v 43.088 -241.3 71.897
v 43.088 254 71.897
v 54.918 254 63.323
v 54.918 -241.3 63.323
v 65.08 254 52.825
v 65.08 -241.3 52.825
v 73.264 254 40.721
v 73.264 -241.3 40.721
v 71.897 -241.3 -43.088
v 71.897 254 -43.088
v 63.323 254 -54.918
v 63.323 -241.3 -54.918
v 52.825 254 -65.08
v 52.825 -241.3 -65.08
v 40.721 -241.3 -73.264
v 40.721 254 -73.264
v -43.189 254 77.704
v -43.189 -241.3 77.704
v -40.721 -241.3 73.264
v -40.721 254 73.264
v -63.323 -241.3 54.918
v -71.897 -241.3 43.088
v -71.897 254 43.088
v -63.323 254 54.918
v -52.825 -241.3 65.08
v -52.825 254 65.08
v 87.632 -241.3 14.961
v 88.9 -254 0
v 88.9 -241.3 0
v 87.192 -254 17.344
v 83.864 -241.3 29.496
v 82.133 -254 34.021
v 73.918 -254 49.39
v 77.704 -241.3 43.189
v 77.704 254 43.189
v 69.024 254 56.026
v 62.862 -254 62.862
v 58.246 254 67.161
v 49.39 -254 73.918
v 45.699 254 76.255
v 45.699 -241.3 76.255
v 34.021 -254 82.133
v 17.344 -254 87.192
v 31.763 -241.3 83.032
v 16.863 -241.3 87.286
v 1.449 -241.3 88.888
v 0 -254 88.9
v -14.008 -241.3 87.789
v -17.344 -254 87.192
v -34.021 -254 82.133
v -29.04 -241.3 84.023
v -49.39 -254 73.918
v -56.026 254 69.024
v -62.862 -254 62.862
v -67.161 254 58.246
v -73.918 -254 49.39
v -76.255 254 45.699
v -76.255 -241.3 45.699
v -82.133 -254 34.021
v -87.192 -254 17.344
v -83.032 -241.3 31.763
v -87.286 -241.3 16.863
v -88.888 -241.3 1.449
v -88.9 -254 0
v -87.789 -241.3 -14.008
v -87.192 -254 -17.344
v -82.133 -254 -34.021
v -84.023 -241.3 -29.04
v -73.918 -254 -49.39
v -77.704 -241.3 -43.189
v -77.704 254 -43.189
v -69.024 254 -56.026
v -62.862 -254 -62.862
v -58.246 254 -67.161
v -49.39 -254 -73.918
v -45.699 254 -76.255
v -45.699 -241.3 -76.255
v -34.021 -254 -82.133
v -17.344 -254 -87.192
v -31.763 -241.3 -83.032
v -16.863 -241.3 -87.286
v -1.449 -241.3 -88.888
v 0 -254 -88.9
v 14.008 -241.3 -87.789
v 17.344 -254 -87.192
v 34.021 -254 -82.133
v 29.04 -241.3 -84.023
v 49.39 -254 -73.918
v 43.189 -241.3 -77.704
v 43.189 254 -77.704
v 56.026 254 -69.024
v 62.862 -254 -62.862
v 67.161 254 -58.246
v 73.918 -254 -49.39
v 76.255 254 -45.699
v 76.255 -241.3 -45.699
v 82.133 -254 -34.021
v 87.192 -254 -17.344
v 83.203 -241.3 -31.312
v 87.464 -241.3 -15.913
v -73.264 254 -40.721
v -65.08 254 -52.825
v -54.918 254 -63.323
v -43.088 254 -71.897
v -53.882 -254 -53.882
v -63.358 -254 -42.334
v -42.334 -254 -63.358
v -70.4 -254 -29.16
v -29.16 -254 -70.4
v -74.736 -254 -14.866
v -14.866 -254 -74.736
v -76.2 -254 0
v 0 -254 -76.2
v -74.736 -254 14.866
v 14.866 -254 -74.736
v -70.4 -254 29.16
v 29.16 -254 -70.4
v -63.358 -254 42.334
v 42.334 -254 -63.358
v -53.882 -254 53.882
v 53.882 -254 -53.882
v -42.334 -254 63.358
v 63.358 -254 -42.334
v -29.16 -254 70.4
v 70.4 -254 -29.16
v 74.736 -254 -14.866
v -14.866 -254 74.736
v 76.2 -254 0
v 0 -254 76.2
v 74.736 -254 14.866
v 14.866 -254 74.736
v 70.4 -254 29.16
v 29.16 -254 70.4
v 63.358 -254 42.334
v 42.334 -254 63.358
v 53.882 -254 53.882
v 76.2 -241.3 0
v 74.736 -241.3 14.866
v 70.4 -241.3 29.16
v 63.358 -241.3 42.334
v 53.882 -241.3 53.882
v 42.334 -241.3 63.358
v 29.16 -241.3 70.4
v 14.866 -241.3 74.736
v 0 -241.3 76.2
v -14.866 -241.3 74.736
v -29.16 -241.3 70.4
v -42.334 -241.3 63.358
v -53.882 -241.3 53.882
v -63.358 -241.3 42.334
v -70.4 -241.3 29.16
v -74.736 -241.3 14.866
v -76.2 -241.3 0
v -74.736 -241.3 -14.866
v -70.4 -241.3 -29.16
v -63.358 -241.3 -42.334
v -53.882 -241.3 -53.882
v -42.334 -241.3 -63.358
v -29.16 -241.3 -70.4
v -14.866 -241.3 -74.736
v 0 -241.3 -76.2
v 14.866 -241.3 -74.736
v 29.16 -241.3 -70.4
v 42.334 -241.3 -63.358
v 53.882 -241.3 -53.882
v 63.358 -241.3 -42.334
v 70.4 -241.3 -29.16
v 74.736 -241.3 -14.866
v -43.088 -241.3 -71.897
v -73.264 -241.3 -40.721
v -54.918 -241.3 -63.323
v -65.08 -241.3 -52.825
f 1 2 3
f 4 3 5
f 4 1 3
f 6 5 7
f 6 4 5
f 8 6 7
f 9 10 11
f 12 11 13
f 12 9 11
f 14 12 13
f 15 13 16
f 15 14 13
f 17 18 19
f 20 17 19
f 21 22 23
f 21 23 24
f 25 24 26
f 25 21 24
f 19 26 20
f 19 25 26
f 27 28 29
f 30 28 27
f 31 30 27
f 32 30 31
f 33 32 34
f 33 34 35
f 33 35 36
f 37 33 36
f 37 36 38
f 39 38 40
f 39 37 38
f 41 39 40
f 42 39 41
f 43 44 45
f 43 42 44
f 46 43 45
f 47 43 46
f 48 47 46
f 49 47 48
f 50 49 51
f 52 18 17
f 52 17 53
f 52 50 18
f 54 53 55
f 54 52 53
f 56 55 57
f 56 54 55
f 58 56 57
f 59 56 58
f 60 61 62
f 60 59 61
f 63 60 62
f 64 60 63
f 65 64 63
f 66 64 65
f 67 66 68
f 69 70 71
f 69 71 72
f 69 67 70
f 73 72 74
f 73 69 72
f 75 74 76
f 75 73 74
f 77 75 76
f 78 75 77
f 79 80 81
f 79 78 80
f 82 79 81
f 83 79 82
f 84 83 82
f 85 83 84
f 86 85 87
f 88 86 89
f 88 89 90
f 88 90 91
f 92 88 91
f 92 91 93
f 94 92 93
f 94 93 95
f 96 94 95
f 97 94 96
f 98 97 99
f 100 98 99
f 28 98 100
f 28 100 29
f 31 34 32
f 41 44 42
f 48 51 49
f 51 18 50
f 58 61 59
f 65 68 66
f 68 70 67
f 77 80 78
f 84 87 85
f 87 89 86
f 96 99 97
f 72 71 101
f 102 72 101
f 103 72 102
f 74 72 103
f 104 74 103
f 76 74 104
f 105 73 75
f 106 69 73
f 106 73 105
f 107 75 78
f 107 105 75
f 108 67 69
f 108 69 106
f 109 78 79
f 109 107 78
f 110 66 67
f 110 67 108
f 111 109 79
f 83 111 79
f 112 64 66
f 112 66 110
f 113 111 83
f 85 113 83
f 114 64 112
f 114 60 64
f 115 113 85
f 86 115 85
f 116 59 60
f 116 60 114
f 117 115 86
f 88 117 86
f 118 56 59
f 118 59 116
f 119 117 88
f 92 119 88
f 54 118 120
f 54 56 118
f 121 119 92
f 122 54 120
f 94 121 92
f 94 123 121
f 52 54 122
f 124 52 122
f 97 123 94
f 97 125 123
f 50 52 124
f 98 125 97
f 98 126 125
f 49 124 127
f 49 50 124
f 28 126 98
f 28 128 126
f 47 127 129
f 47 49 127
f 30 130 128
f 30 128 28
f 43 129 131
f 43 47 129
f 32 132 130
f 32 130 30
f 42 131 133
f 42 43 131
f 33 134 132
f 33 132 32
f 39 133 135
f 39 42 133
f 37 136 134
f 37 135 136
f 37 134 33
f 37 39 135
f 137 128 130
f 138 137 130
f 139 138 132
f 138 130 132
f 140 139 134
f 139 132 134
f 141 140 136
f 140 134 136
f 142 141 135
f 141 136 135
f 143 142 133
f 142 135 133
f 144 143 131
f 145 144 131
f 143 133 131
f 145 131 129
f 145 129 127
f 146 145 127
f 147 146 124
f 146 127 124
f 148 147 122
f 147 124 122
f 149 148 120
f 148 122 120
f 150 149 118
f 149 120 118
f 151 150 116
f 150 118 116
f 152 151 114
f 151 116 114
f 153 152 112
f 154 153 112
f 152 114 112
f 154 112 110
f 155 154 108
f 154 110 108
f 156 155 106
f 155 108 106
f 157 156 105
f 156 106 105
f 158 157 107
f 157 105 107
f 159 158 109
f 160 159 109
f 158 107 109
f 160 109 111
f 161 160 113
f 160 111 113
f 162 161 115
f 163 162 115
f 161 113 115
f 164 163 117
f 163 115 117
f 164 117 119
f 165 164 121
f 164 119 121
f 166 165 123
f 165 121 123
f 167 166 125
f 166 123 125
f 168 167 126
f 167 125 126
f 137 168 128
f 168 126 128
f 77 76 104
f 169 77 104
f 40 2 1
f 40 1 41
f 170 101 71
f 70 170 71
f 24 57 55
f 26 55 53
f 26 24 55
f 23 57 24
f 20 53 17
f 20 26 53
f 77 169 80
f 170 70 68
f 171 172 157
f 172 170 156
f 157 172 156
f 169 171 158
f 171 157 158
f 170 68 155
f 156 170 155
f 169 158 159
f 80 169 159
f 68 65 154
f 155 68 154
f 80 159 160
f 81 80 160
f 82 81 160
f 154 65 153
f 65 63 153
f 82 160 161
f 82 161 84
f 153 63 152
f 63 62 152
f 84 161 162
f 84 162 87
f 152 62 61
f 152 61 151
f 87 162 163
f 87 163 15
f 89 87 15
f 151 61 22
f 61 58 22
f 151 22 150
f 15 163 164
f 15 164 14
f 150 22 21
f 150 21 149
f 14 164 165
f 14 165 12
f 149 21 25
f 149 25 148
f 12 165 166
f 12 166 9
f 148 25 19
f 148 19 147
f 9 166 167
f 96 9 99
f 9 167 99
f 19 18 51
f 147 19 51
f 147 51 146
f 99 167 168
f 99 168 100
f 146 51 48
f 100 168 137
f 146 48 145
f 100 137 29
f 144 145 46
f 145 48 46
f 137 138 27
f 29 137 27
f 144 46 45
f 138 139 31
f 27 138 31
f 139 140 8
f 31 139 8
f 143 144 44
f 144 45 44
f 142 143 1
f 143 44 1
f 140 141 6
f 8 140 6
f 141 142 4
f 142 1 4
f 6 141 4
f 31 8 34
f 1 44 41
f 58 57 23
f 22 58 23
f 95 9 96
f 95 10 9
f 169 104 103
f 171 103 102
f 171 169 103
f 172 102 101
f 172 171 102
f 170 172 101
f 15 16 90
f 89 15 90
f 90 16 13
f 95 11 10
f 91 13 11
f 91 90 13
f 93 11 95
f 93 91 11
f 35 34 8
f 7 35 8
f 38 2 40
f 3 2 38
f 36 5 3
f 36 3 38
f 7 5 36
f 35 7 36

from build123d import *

# Parameters (mm, degrees)
SKETCH2_R               = 88.9
SKETCH2_R_2             = 83.82
BOSS_EXTRUDE1_DEPTH     = 254
CUT_EXTRUDE1_DEPTH      = 255
CUT_EXTRUDE1_DEPTH_BACK = 255
SKETCH4_R               = 88.9
SKETCH4_R_2             = 76.2
BOSS_EXTRUDE2_DEPTH     = 12.7


with BuildPart() as part:
    # Sketch2 → Boss-Extrude1 (new body, symmetric)
    with BuildSketch(Plane(origin=(0, 0, 0), x_dir=(1, 0, 0), z_dir=(0, 1, 0))):
        Circle(SKETCH2_R)
        Circle(SKETCH2_R_2, mode=Mode.SUBTRACT)
    extrude(amount=BOSS_EXTRUDE1_DEPTH, both=True)

    # Sketch3 → Cut-Extrude1 (cut, two sides)
    with BuildSketch(Plane(origin=(0, 0, 0), x_dir=(1, 0, 0), z_dir=(0, 1, 0))) as cut_extrude1_sk:
        Polygon((169.661755759, -94.300371224), (0, 0), (169.661755759, 101.677593364), align=None)
        Polygon((0, 0), (53.900027233, 96.974944394), (-58.116685864, 96.974944394), align=None)
        Polygon((-123.741299607, 68.777140945), (-123.741299607, -74.157652604), (0, 0), align=None)
        Polygon((-65.840936026, -118.45858783), (0, 0), (70.991745134, -118.45858783), align=None)
    extrude(amount=CUT_EXTRUDE1_DEPTH, mode=Mode.SUBTRACT)
    extrude(cut_extrude1_sk.sketch, amount=-CUT_EXTRUDE1_DEPTH_BACK, mode=Mode.SUBTRACT)

    # Sketch4 → Boss-Extrude2 (add)
    with BuildSketch(Plane.XZ.offset(254)):
        Circle(SKETCH4_R)
        Circle(SKETCH4_R_2, mode=Mode.SUBTRACT)
    extrude(amount=-BOSS_EXTRUDE2_DEPTH)


solid = part.part
